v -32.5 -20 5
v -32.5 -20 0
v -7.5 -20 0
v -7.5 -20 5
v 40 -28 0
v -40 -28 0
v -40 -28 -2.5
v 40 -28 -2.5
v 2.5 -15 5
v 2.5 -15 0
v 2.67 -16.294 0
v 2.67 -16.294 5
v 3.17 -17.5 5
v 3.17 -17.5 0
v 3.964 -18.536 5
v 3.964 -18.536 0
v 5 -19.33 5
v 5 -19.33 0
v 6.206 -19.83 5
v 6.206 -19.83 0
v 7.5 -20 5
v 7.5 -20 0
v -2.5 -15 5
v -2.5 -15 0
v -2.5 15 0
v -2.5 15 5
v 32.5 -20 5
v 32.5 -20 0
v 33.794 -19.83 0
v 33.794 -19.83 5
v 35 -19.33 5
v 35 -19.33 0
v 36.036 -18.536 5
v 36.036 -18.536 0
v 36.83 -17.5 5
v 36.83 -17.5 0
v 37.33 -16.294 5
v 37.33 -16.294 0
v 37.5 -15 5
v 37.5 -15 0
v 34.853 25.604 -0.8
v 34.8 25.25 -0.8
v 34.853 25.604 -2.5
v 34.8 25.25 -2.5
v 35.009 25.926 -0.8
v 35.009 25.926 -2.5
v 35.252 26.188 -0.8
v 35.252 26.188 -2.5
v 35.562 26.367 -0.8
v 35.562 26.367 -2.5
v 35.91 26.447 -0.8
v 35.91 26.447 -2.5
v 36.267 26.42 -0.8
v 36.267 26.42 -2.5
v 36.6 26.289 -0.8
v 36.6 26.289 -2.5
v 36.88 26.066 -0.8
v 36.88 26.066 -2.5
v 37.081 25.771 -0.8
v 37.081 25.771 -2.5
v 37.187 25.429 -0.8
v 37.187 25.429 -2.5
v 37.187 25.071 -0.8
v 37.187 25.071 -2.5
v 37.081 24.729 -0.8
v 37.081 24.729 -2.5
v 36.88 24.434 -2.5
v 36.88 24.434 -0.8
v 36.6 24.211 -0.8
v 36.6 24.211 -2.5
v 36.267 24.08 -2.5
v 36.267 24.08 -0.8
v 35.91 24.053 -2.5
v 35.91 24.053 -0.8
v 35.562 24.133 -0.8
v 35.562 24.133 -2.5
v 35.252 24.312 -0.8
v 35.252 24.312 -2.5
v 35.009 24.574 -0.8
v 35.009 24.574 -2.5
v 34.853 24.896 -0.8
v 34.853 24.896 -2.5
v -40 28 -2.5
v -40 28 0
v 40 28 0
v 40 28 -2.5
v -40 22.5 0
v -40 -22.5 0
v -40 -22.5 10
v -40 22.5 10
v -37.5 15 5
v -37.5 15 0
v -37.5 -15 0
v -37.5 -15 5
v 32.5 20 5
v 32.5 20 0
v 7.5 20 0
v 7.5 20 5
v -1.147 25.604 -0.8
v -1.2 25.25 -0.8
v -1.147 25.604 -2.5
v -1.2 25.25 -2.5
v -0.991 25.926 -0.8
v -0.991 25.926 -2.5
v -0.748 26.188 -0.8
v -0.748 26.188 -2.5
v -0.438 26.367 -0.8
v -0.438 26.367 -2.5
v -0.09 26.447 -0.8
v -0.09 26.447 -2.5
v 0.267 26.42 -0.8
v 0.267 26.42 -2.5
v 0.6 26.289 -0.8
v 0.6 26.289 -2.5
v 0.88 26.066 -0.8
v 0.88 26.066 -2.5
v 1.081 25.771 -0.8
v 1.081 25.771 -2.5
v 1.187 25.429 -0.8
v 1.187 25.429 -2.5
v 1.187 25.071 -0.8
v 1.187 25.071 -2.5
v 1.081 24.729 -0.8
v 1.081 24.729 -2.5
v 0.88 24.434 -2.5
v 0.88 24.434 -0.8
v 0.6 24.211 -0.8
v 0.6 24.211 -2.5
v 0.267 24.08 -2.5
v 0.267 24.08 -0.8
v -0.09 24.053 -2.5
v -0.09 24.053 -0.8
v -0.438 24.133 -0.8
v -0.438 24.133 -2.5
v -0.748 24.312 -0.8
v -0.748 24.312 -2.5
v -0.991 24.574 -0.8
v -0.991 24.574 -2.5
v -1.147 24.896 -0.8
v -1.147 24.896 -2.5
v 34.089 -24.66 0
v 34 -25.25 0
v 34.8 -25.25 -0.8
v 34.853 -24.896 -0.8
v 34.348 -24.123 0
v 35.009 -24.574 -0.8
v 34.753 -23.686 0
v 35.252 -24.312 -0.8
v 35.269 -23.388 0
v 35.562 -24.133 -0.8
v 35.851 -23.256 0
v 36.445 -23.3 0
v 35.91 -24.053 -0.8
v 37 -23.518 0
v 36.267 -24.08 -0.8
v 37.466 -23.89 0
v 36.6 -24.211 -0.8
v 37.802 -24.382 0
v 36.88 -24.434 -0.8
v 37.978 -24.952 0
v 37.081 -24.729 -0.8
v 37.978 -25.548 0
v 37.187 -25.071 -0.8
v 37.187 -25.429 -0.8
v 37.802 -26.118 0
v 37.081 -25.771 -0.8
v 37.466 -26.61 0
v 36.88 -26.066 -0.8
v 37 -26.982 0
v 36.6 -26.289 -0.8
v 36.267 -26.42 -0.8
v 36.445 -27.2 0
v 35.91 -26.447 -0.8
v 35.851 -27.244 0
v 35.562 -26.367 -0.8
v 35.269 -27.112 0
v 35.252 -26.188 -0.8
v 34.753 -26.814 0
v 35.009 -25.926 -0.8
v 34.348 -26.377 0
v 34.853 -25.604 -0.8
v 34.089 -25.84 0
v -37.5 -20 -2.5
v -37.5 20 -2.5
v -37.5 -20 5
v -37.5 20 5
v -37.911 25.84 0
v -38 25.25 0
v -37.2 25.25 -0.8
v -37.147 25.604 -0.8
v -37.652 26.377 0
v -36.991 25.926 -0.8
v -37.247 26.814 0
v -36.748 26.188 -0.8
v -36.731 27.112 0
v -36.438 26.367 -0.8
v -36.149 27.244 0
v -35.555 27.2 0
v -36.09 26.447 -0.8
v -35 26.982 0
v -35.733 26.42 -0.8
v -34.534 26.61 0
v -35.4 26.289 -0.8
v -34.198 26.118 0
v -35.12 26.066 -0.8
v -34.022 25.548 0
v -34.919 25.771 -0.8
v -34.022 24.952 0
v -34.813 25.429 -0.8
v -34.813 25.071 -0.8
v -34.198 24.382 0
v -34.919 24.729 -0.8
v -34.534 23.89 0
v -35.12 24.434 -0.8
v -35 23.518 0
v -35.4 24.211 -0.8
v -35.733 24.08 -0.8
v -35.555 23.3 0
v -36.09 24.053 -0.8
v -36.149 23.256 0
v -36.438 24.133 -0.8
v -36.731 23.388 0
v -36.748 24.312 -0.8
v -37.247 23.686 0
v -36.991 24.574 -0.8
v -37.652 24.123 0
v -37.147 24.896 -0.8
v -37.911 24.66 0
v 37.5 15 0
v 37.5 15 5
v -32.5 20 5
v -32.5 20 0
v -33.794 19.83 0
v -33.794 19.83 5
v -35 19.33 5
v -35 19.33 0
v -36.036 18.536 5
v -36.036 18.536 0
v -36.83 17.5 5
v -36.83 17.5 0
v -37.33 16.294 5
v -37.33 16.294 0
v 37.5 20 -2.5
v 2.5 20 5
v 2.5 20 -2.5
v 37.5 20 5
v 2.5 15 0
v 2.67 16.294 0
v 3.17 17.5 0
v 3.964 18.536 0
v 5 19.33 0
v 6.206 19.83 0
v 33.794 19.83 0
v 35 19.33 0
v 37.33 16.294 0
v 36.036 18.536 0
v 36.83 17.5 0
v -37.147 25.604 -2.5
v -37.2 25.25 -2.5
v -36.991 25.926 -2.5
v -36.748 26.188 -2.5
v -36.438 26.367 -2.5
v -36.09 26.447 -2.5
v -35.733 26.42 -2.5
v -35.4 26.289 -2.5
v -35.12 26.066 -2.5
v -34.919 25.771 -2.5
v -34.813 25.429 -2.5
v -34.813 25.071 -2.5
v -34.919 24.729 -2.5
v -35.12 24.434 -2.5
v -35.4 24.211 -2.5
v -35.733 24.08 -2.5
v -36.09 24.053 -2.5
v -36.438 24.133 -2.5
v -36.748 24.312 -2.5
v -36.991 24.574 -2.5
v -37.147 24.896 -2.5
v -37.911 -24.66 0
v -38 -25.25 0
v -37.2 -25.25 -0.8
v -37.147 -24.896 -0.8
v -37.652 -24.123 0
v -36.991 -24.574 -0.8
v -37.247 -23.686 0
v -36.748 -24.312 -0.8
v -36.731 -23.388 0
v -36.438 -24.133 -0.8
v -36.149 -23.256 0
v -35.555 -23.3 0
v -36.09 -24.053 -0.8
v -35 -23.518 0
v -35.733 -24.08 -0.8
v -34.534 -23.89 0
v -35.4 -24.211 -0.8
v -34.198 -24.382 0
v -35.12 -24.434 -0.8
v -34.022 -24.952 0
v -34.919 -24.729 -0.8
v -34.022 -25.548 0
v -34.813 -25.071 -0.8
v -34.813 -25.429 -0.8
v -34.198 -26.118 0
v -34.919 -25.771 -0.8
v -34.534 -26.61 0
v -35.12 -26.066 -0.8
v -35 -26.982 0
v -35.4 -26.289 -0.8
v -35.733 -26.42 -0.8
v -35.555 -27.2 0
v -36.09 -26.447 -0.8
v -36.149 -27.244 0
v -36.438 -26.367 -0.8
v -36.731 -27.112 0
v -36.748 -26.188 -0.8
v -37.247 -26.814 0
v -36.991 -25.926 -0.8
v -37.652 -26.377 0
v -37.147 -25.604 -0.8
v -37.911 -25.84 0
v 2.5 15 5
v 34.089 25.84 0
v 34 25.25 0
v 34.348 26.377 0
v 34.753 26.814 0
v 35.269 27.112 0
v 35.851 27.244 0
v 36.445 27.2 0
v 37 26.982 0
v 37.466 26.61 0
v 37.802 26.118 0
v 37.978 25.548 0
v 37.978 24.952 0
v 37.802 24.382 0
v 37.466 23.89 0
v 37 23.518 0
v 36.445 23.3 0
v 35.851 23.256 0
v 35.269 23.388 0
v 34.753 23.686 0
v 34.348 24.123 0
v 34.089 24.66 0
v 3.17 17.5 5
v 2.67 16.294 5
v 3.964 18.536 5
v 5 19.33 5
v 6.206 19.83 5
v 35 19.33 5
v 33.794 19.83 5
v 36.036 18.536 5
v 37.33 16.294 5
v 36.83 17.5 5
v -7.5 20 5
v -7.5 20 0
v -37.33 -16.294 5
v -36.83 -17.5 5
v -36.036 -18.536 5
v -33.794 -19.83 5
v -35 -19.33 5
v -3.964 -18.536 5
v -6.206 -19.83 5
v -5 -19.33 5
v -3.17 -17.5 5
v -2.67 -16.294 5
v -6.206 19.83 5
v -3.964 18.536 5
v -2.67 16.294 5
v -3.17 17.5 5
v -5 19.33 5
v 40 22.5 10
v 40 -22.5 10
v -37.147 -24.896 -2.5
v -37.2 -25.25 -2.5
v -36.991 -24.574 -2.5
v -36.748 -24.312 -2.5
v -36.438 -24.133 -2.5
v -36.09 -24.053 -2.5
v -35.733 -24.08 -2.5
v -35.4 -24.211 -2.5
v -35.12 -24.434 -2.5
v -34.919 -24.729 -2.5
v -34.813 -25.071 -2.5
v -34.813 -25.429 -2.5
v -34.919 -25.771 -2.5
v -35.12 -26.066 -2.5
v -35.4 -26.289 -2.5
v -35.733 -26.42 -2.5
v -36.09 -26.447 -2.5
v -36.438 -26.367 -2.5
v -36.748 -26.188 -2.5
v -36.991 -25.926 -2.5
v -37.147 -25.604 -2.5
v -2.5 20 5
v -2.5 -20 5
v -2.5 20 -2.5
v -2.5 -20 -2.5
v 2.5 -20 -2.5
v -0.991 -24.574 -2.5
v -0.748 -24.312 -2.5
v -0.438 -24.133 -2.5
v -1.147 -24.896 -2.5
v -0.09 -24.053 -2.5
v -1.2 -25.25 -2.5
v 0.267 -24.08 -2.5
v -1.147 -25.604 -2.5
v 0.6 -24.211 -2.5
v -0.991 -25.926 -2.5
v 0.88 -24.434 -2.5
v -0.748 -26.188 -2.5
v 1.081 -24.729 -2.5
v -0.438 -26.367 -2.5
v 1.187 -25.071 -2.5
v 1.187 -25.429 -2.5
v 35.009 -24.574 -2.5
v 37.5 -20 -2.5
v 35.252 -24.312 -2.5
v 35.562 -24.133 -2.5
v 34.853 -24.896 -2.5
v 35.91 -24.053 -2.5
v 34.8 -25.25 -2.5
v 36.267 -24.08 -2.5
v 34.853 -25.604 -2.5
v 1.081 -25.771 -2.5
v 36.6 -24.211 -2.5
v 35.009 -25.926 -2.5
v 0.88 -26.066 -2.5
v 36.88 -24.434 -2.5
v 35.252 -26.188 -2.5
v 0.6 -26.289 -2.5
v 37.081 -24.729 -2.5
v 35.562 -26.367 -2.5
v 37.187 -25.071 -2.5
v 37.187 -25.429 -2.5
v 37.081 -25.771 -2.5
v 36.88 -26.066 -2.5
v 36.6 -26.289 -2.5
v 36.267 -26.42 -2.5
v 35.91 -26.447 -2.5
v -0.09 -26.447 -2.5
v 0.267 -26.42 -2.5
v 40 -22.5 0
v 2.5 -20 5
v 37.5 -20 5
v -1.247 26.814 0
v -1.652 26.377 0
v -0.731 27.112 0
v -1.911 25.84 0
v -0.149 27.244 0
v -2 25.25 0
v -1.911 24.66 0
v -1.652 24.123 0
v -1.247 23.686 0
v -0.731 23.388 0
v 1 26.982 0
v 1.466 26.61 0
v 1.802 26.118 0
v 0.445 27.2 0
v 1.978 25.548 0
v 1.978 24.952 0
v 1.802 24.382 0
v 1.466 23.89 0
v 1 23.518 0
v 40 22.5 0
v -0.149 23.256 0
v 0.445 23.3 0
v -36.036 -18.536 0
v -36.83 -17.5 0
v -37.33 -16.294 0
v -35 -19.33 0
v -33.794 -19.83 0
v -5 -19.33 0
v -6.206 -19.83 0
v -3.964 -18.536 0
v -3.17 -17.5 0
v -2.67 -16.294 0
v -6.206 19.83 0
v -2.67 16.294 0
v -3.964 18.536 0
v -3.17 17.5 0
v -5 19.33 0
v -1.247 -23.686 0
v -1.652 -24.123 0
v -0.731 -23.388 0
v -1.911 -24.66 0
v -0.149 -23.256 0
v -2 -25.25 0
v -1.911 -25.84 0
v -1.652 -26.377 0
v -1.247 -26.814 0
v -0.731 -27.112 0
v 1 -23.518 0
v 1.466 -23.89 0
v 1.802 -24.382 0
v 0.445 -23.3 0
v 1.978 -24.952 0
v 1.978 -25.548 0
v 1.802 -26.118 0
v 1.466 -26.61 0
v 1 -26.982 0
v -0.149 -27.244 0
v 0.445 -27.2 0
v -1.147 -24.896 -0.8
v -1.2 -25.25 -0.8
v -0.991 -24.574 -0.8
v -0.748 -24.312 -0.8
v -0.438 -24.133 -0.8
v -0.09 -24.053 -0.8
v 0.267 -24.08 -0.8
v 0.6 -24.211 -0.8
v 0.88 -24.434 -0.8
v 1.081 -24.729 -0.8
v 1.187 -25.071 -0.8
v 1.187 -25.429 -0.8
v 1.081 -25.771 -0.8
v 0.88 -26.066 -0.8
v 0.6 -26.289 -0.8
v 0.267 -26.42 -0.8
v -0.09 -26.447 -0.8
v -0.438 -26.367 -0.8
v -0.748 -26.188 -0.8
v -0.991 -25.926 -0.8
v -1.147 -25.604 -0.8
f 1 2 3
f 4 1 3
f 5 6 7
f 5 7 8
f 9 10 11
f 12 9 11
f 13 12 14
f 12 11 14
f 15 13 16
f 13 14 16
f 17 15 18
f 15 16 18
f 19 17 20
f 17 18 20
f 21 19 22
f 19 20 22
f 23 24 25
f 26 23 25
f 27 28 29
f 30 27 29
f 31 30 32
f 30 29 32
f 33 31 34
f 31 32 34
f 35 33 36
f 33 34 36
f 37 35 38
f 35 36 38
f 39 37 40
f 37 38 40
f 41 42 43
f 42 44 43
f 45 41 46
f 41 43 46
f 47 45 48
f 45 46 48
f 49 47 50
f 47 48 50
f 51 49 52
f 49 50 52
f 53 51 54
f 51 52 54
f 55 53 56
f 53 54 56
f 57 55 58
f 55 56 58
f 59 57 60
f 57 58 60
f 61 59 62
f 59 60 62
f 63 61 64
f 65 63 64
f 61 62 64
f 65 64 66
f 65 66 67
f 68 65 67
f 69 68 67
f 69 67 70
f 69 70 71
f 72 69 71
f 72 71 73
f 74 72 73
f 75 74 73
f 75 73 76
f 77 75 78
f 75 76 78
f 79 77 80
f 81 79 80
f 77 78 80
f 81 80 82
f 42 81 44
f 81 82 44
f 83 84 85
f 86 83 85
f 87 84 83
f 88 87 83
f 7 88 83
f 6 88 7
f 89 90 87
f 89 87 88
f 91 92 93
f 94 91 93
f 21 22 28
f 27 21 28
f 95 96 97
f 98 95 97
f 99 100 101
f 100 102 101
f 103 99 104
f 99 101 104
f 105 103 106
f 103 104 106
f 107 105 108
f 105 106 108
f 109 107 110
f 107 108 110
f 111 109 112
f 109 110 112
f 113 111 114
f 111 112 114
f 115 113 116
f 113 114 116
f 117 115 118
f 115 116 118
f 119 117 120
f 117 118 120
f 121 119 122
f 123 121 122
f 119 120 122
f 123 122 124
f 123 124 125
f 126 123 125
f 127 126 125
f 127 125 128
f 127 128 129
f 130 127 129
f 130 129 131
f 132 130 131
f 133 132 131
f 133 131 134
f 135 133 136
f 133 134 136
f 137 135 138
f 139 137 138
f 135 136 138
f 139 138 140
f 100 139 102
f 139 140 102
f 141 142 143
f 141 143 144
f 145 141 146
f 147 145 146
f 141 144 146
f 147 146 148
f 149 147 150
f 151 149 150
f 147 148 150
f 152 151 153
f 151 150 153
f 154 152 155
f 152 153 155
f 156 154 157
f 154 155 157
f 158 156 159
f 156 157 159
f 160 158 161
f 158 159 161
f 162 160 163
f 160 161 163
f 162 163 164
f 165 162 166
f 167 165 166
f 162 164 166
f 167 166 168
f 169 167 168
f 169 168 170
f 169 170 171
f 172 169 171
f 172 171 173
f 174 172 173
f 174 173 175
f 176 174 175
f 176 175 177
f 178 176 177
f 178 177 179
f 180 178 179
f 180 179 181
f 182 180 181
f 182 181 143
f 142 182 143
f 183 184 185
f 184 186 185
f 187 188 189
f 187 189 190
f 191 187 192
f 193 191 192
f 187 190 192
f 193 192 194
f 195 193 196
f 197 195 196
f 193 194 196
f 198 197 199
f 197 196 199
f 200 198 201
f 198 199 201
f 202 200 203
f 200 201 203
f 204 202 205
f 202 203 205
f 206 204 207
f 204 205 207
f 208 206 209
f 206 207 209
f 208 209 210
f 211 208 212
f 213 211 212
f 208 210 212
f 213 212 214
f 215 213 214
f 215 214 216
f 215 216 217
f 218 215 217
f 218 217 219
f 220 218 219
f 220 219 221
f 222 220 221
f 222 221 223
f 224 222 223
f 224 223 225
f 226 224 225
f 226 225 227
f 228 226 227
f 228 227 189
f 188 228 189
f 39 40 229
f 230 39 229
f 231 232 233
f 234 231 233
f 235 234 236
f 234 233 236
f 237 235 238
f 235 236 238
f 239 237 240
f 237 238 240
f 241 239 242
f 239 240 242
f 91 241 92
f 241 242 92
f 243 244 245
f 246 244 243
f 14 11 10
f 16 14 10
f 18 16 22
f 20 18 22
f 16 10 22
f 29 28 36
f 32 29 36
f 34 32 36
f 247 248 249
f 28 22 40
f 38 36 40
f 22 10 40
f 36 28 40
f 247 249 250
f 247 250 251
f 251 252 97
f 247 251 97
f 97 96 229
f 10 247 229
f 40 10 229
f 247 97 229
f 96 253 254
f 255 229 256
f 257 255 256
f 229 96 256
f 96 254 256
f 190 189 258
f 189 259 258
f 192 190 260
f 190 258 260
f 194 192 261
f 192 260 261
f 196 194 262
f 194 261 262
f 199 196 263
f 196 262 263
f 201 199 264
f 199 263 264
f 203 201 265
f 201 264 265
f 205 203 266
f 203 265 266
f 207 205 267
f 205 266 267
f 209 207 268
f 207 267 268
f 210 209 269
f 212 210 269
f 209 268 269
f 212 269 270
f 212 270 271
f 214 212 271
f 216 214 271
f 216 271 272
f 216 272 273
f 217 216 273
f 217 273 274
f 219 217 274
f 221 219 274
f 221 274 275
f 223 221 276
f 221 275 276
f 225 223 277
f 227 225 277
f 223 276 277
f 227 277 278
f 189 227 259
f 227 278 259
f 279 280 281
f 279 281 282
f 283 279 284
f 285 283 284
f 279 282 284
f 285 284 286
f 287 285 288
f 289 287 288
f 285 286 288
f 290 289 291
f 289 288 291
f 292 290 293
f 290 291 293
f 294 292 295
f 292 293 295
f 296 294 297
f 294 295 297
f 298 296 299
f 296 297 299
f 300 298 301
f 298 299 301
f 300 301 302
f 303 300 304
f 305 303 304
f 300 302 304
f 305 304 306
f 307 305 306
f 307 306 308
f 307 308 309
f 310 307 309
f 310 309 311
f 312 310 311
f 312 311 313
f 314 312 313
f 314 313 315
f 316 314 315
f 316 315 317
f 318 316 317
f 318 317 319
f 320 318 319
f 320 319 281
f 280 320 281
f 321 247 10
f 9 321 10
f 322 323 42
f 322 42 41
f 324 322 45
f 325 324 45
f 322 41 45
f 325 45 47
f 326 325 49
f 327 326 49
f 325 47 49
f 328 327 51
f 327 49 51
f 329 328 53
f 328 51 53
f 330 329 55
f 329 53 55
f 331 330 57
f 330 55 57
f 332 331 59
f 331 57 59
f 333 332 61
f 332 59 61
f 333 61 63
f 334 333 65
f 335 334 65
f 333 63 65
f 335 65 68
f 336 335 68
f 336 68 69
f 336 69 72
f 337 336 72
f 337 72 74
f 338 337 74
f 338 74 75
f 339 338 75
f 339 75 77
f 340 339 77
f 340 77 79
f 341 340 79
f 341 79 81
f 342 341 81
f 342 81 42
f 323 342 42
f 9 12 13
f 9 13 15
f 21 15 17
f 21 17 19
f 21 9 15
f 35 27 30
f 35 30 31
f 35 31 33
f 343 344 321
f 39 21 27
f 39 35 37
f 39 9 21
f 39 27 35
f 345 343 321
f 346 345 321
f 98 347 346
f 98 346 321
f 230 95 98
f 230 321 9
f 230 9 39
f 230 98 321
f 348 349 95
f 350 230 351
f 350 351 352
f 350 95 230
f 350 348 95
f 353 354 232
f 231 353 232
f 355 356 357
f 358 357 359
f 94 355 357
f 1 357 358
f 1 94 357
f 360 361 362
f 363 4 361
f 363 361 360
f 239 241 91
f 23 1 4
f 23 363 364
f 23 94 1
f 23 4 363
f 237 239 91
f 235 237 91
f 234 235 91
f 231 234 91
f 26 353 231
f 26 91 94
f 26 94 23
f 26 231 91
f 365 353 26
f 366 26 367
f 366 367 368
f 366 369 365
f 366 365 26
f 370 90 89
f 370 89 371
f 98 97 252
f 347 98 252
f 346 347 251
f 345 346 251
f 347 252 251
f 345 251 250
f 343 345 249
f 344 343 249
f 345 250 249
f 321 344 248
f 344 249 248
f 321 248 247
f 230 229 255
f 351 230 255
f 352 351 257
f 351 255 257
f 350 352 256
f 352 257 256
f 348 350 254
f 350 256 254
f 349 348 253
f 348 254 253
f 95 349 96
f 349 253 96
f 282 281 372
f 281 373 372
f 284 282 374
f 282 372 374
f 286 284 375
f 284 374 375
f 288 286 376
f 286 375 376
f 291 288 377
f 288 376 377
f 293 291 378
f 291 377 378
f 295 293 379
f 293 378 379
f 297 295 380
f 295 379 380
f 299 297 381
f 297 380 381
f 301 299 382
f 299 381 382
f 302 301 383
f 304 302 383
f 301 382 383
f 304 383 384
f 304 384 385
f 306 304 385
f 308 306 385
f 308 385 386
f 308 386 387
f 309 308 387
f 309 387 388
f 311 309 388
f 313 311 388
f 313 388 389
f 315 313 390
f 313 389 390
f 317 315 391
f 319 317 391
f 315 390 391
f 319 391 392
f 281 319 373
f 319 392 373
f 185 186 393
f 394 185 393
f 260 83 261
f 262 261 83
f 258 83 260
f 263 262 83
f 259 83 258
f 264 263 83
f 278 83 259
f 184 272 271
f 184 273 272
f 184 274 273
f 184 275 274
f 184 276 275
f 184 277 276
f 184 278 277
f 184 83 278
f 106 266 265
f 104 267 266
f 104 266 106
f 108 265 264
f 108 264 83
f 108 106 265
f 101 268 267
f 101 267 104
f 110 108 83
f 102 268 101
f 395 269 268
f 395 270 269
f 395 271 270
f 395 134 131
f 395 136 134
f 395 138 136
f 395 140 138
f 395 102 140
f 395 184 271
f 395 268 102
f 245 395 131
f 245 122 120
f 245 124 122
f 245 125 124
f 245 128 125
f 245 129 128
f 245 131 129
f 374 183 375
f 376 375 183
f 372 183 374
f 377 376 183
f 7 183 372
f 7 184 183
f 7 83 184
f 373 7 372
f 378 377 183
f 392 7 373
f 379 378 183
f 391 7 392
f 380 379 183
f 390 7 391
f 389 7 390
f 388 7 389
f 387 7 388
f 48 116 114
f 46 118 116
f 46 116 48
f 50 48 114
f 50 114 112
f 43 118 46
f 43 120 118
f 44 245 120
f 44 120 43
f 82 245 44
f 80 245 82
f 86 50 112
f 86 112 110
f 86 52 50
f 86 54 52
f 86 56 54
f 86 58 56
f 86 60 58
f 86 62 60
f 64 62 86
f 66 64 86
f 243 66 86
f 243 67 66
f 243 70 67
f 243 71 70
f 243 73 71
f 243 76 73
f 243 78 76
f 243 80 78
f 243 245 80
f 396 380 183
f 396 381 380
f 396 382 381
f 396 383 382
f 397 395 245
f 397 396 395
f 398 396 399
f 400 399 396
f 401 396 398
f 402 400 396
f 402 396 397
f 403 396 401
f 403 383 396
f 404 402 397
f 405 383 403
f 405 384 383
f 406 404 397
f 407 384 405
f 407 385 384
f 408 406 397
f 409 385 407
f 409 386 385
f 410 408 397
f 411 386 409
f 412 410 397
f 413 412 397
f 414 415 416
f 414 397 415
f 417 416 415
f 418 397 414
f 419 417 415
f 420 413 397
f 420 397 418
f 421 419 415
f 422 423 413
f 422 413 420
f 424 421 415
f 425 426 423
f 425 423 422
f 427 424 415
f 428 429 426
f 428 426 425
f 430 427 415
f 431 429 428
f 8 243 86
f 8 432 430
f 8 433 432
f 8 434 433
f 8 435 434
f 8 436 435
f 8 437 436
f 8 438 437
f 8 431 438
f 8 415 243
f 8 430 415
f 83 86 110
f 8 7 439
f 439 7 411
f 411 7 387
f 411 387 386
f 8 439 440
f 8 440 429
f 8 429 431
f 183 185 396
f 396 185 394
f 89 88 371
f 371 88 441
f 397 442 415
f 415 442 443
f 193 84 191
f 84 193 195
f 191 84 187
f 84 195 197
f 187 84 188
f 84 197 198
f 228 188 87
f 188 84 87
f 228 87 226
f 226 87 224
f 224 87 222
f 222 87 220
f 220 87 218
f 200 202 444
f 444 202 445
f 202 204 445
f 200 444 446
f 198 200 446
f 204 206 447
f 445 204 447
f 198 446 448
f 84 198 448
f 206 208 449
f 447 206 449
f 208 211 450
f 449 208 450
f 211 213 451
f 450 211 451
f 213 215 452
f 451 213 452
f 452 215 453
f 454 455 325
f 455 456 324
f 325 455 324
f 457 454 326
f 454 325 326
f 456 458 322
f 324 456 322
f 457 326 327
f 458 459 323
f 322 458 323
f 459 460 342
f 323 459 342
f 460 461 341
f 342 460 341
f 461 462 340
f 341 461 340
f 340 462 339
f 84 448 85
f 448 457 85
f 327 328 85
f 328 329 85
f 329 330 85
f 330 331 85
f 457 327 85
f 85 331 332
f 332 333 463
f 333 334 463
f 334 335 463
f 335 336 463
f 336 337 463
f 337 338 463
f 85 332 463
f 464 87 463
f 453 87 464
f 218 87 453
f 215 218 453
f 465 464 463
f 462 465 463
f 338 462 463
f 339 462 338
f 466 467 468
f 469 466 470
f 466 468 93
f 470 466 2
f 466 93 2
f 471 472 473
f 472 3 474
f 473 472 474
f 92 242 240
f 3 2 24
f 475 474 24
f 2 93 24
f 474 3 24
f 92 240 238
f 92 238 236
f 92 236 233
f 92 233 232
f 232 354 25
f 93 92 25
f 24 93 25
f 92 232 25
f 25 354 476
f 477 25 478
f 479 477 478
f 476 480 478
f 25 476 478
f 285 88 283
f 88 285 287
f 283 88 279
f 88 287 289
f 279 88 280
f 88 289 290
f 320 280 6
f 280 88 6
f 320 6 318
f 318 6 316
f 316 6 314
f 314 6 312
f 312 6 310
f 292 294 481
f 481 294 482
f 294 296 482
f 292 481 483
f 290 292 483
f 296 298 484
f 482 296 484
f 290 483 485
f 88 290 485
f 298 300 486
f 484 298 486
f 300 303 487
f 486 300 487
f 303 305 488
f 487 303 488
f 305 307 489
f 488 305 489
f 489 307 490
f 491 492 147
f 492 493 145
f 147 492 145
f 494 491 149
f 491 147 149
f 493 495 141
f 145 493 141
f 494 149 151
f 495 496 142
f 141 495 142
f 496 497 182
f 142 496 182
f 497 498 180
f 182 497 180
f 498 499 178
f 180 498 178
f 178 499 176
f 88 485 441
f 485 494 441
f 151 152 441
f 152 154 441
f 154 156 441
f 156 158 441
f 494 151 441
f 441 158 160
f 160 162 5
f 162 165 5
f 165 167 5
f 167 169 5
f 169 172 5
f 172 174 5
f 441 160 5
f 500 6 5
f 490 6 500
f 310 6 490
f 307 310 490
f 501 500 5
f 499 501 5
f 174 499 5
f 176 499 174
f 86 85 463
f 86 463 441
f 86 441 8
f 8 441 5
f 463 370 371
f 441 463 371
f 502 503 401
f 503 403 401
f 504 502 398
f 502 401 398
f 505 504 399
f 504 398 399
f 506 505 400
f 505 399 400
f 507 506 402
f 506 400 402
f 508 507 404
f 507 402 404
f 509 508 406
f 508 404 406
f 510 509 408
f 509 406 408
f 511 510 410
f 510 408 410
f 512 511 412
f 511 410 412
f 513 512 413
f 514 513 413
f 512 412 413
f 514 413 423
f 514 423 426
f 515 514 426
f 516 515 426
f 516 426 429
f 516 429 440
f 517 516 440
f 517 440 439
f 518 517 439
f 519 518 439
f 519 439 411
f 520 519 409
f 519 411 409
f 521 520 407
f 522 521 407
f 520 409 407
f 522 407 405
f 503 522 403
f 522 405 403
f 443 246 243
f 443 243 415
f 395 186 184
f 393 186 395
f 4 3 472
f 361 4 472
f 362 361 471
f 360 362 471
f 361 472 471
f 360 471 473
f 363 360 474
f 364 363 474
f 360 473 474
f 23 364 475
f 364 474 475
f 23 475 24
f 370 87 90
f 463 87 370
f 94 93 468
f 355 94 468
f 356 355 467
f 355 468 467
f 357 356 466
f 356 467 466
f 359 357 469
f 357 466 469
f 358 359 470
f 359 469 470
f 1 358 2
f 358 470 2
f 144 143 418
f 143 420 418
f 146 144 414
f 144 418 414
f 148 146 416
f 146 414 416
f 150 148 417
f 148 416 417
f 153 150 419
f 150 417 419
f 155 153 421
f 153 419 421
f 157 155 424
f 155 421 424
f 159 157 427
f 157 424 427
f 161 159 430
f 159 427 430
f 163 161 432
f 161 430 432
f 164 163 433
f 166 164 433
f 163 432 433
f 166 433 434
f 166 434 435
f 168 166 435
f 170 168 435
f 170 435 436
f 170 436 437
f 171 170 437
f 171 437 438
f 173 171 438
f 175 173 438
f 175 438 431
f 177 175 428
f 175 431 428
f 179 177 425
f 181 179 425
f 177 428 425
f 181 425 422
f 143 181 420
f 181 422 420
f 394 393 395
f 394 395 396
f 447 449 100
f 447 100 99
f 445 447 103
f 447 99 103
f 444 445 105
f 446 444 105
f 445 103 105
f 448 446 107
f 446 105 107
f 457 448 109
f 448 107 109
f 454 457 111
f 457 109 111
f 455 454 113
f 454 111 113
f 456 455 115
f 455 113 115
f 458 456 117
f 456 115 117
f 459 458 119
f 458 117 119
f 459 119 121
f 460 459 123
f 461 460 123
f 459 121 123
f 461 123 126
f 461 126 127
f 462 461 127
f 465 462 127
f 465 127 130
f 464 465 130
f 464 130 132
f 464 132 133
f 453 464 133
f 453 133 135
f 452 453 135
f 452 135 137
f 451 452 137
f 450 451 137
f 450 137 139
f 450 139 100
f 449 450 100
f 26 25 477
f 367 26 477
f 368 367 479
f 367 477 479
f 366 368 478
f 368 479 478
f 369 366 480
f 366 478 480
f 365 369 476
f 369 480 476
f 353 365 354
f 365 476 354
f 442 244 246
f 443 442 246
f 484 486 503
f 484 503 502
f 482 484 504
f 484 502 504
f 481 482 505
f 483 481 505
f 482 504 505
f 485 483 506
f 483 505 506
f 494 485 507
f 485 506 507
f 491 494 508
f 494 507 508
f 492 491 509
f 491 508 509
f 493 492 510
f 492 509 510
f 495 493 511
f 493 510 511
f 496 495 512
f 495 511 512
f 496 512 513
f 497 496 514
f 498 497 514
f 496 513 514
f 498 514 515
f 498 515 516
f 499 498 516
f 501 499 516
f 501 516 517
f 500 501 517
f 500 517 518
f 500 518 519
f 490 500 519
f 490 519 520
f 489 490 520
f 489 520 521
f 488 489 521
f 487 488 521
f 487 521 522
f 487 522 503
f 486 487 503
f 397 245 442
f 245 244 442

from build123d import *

# Parameters (mm, degrees)
PAD001_DEPTH     = 5
SKETCH002_W      = 80
SKETCH002_H      = 45
SKETCH002_W_2    = 35
SKETCH002_H_2    = 40
PAD002_DEPTH     = 5
SKETCH_W         = 80
SKETCH_H         = 45
PAD_DEPTH        = 5
SKETCH005_W      = 80
SKETCH005_H      = 56
SKETCH005_W_2    = 35
SKETCH005_H_2    = 40
PAD004_DEPTH     = 2.5
HOLE_D           = 2.4
HOLE_DEPTH       = 198.867435
HOLE_CSINK_D     = 4
HOLE_CSINK_ANGLE = 90
PAD003_DEPTH     = 5


with BuildPart() as body001:
    # Sketch001 → Pad001 (new body)
    with BuildSketch(Plane.XY):
        with BuildLine():
            Line((37.5, -15), (37.5, 15))
            ThreePointArc((37.5, 15), (36.035534, 18.535534), (32.5, 20))
            Line((32.5, 20), (7.5, 20))
            ThreePointArc((7.5, 20), (3.964466, 18.535534), (2.5, 15))
            Line((2.5, 15), (2.5, -15))
            ThreePointArc((2.5, -15), (3.964466, -18.535534), (7.5, -20))
            Line((7.5, -20), (32.5, -20))
            ThreePointArc((32.5, -20), (36.035534, -18.535534), (37.5, -15))
        make_face()
    extrude(amount=PAD001_DEPTH)


with BuildPart() as cuerpo:
    # Sketch002 (on Sketch) → Pad002 (new body)
    with BuildSketch(Plane.XY):
        Rectangle(SKETCH002_W, SKETCH002_H)
        with Locations((-20, 0)):
            Rectangle(SKETCH002_W_2, SKETCH002_H_2, mode=Mode.SUBTRACT)
        with Locations((20, 0)):
            Rectangle(SKETCH002_W_2, SKETCH002_H_2, mode=Mode.SUBTRACT)
    extrude(amount=PAD002_DEPTH)

    # Sketch (on Face14 of Pad002) → Pad (join)
    with BuildSketch(Plane.XY.offset(5)):
        Rectangle(SKETCH_W, SKETCH_H)
    extrude(amount=PAD_DEPTH)

    # Sketch005 (on Face4 of Pad) → Pad004 (join)
    with BuildSketch(Plane(origin=(0, 0, 0), x_dir=(1, 0, 0), z_dir=(0, 0, -1))):
        Rectangle(SKETCH005_W, SKETCH005_H)
        with Locations((-20, 0)):
            Rectangle(SKETCH005_W_2, SKETCH005_H_2, mode=Mode.SUBTRACT)
        with Locations((20, 0)):
            Rectangle(SKETCH005_W_2, SKETCH005_H_2, mode=Mode.SUBTRACT)
    extrude(amount=PAD004_DEPTH)

    # Hole
    with Locations(Plane.XY):
        with Locations((-36, -25.25), (0, -25.25), (36, -25.25), (-36, 25.25), (0, 25.25), (36, 25.25)):
            CounterSinkHole(HOLE_D / 2, HOLE_CSINK_D / 2, depth=HOLE_DEPTH, counter_sink_angle=HOLE_CSINK_ANGLE)


with BuildPart() as body003:
    # Sketch003 → Pad003 (new body)
    with BuildSketch(Plane.XY):
        with BuildLine():
            Line((-2.5, -15), (-2.5, 15))
            ThreePointArc((-2.5, 15), (-3.964466, 18.535534), (-7.5, 20))
            Line((-7.5, 20), (-32.5, 20))
            ThreePointArc((-32.5, 20), (-36.035534, 18.535534), (-37.5, 15))
            Line((-37.5, 15), (-37.5, -15))
            ThreePointArc((-37.5, -15), (-36.035534, -18.535534), (-32.5, -20))
            Line((-32.5, -20), (-7.5, -20))
            ThreePointArc((-7.5, -20), (-3.964466, -18.535534), (-2.5, -15))
        make_face()
    extrude(amount=PAD003_DEPTH)


solid = Compound([body001.part, cuerpo.part, body003.part])
